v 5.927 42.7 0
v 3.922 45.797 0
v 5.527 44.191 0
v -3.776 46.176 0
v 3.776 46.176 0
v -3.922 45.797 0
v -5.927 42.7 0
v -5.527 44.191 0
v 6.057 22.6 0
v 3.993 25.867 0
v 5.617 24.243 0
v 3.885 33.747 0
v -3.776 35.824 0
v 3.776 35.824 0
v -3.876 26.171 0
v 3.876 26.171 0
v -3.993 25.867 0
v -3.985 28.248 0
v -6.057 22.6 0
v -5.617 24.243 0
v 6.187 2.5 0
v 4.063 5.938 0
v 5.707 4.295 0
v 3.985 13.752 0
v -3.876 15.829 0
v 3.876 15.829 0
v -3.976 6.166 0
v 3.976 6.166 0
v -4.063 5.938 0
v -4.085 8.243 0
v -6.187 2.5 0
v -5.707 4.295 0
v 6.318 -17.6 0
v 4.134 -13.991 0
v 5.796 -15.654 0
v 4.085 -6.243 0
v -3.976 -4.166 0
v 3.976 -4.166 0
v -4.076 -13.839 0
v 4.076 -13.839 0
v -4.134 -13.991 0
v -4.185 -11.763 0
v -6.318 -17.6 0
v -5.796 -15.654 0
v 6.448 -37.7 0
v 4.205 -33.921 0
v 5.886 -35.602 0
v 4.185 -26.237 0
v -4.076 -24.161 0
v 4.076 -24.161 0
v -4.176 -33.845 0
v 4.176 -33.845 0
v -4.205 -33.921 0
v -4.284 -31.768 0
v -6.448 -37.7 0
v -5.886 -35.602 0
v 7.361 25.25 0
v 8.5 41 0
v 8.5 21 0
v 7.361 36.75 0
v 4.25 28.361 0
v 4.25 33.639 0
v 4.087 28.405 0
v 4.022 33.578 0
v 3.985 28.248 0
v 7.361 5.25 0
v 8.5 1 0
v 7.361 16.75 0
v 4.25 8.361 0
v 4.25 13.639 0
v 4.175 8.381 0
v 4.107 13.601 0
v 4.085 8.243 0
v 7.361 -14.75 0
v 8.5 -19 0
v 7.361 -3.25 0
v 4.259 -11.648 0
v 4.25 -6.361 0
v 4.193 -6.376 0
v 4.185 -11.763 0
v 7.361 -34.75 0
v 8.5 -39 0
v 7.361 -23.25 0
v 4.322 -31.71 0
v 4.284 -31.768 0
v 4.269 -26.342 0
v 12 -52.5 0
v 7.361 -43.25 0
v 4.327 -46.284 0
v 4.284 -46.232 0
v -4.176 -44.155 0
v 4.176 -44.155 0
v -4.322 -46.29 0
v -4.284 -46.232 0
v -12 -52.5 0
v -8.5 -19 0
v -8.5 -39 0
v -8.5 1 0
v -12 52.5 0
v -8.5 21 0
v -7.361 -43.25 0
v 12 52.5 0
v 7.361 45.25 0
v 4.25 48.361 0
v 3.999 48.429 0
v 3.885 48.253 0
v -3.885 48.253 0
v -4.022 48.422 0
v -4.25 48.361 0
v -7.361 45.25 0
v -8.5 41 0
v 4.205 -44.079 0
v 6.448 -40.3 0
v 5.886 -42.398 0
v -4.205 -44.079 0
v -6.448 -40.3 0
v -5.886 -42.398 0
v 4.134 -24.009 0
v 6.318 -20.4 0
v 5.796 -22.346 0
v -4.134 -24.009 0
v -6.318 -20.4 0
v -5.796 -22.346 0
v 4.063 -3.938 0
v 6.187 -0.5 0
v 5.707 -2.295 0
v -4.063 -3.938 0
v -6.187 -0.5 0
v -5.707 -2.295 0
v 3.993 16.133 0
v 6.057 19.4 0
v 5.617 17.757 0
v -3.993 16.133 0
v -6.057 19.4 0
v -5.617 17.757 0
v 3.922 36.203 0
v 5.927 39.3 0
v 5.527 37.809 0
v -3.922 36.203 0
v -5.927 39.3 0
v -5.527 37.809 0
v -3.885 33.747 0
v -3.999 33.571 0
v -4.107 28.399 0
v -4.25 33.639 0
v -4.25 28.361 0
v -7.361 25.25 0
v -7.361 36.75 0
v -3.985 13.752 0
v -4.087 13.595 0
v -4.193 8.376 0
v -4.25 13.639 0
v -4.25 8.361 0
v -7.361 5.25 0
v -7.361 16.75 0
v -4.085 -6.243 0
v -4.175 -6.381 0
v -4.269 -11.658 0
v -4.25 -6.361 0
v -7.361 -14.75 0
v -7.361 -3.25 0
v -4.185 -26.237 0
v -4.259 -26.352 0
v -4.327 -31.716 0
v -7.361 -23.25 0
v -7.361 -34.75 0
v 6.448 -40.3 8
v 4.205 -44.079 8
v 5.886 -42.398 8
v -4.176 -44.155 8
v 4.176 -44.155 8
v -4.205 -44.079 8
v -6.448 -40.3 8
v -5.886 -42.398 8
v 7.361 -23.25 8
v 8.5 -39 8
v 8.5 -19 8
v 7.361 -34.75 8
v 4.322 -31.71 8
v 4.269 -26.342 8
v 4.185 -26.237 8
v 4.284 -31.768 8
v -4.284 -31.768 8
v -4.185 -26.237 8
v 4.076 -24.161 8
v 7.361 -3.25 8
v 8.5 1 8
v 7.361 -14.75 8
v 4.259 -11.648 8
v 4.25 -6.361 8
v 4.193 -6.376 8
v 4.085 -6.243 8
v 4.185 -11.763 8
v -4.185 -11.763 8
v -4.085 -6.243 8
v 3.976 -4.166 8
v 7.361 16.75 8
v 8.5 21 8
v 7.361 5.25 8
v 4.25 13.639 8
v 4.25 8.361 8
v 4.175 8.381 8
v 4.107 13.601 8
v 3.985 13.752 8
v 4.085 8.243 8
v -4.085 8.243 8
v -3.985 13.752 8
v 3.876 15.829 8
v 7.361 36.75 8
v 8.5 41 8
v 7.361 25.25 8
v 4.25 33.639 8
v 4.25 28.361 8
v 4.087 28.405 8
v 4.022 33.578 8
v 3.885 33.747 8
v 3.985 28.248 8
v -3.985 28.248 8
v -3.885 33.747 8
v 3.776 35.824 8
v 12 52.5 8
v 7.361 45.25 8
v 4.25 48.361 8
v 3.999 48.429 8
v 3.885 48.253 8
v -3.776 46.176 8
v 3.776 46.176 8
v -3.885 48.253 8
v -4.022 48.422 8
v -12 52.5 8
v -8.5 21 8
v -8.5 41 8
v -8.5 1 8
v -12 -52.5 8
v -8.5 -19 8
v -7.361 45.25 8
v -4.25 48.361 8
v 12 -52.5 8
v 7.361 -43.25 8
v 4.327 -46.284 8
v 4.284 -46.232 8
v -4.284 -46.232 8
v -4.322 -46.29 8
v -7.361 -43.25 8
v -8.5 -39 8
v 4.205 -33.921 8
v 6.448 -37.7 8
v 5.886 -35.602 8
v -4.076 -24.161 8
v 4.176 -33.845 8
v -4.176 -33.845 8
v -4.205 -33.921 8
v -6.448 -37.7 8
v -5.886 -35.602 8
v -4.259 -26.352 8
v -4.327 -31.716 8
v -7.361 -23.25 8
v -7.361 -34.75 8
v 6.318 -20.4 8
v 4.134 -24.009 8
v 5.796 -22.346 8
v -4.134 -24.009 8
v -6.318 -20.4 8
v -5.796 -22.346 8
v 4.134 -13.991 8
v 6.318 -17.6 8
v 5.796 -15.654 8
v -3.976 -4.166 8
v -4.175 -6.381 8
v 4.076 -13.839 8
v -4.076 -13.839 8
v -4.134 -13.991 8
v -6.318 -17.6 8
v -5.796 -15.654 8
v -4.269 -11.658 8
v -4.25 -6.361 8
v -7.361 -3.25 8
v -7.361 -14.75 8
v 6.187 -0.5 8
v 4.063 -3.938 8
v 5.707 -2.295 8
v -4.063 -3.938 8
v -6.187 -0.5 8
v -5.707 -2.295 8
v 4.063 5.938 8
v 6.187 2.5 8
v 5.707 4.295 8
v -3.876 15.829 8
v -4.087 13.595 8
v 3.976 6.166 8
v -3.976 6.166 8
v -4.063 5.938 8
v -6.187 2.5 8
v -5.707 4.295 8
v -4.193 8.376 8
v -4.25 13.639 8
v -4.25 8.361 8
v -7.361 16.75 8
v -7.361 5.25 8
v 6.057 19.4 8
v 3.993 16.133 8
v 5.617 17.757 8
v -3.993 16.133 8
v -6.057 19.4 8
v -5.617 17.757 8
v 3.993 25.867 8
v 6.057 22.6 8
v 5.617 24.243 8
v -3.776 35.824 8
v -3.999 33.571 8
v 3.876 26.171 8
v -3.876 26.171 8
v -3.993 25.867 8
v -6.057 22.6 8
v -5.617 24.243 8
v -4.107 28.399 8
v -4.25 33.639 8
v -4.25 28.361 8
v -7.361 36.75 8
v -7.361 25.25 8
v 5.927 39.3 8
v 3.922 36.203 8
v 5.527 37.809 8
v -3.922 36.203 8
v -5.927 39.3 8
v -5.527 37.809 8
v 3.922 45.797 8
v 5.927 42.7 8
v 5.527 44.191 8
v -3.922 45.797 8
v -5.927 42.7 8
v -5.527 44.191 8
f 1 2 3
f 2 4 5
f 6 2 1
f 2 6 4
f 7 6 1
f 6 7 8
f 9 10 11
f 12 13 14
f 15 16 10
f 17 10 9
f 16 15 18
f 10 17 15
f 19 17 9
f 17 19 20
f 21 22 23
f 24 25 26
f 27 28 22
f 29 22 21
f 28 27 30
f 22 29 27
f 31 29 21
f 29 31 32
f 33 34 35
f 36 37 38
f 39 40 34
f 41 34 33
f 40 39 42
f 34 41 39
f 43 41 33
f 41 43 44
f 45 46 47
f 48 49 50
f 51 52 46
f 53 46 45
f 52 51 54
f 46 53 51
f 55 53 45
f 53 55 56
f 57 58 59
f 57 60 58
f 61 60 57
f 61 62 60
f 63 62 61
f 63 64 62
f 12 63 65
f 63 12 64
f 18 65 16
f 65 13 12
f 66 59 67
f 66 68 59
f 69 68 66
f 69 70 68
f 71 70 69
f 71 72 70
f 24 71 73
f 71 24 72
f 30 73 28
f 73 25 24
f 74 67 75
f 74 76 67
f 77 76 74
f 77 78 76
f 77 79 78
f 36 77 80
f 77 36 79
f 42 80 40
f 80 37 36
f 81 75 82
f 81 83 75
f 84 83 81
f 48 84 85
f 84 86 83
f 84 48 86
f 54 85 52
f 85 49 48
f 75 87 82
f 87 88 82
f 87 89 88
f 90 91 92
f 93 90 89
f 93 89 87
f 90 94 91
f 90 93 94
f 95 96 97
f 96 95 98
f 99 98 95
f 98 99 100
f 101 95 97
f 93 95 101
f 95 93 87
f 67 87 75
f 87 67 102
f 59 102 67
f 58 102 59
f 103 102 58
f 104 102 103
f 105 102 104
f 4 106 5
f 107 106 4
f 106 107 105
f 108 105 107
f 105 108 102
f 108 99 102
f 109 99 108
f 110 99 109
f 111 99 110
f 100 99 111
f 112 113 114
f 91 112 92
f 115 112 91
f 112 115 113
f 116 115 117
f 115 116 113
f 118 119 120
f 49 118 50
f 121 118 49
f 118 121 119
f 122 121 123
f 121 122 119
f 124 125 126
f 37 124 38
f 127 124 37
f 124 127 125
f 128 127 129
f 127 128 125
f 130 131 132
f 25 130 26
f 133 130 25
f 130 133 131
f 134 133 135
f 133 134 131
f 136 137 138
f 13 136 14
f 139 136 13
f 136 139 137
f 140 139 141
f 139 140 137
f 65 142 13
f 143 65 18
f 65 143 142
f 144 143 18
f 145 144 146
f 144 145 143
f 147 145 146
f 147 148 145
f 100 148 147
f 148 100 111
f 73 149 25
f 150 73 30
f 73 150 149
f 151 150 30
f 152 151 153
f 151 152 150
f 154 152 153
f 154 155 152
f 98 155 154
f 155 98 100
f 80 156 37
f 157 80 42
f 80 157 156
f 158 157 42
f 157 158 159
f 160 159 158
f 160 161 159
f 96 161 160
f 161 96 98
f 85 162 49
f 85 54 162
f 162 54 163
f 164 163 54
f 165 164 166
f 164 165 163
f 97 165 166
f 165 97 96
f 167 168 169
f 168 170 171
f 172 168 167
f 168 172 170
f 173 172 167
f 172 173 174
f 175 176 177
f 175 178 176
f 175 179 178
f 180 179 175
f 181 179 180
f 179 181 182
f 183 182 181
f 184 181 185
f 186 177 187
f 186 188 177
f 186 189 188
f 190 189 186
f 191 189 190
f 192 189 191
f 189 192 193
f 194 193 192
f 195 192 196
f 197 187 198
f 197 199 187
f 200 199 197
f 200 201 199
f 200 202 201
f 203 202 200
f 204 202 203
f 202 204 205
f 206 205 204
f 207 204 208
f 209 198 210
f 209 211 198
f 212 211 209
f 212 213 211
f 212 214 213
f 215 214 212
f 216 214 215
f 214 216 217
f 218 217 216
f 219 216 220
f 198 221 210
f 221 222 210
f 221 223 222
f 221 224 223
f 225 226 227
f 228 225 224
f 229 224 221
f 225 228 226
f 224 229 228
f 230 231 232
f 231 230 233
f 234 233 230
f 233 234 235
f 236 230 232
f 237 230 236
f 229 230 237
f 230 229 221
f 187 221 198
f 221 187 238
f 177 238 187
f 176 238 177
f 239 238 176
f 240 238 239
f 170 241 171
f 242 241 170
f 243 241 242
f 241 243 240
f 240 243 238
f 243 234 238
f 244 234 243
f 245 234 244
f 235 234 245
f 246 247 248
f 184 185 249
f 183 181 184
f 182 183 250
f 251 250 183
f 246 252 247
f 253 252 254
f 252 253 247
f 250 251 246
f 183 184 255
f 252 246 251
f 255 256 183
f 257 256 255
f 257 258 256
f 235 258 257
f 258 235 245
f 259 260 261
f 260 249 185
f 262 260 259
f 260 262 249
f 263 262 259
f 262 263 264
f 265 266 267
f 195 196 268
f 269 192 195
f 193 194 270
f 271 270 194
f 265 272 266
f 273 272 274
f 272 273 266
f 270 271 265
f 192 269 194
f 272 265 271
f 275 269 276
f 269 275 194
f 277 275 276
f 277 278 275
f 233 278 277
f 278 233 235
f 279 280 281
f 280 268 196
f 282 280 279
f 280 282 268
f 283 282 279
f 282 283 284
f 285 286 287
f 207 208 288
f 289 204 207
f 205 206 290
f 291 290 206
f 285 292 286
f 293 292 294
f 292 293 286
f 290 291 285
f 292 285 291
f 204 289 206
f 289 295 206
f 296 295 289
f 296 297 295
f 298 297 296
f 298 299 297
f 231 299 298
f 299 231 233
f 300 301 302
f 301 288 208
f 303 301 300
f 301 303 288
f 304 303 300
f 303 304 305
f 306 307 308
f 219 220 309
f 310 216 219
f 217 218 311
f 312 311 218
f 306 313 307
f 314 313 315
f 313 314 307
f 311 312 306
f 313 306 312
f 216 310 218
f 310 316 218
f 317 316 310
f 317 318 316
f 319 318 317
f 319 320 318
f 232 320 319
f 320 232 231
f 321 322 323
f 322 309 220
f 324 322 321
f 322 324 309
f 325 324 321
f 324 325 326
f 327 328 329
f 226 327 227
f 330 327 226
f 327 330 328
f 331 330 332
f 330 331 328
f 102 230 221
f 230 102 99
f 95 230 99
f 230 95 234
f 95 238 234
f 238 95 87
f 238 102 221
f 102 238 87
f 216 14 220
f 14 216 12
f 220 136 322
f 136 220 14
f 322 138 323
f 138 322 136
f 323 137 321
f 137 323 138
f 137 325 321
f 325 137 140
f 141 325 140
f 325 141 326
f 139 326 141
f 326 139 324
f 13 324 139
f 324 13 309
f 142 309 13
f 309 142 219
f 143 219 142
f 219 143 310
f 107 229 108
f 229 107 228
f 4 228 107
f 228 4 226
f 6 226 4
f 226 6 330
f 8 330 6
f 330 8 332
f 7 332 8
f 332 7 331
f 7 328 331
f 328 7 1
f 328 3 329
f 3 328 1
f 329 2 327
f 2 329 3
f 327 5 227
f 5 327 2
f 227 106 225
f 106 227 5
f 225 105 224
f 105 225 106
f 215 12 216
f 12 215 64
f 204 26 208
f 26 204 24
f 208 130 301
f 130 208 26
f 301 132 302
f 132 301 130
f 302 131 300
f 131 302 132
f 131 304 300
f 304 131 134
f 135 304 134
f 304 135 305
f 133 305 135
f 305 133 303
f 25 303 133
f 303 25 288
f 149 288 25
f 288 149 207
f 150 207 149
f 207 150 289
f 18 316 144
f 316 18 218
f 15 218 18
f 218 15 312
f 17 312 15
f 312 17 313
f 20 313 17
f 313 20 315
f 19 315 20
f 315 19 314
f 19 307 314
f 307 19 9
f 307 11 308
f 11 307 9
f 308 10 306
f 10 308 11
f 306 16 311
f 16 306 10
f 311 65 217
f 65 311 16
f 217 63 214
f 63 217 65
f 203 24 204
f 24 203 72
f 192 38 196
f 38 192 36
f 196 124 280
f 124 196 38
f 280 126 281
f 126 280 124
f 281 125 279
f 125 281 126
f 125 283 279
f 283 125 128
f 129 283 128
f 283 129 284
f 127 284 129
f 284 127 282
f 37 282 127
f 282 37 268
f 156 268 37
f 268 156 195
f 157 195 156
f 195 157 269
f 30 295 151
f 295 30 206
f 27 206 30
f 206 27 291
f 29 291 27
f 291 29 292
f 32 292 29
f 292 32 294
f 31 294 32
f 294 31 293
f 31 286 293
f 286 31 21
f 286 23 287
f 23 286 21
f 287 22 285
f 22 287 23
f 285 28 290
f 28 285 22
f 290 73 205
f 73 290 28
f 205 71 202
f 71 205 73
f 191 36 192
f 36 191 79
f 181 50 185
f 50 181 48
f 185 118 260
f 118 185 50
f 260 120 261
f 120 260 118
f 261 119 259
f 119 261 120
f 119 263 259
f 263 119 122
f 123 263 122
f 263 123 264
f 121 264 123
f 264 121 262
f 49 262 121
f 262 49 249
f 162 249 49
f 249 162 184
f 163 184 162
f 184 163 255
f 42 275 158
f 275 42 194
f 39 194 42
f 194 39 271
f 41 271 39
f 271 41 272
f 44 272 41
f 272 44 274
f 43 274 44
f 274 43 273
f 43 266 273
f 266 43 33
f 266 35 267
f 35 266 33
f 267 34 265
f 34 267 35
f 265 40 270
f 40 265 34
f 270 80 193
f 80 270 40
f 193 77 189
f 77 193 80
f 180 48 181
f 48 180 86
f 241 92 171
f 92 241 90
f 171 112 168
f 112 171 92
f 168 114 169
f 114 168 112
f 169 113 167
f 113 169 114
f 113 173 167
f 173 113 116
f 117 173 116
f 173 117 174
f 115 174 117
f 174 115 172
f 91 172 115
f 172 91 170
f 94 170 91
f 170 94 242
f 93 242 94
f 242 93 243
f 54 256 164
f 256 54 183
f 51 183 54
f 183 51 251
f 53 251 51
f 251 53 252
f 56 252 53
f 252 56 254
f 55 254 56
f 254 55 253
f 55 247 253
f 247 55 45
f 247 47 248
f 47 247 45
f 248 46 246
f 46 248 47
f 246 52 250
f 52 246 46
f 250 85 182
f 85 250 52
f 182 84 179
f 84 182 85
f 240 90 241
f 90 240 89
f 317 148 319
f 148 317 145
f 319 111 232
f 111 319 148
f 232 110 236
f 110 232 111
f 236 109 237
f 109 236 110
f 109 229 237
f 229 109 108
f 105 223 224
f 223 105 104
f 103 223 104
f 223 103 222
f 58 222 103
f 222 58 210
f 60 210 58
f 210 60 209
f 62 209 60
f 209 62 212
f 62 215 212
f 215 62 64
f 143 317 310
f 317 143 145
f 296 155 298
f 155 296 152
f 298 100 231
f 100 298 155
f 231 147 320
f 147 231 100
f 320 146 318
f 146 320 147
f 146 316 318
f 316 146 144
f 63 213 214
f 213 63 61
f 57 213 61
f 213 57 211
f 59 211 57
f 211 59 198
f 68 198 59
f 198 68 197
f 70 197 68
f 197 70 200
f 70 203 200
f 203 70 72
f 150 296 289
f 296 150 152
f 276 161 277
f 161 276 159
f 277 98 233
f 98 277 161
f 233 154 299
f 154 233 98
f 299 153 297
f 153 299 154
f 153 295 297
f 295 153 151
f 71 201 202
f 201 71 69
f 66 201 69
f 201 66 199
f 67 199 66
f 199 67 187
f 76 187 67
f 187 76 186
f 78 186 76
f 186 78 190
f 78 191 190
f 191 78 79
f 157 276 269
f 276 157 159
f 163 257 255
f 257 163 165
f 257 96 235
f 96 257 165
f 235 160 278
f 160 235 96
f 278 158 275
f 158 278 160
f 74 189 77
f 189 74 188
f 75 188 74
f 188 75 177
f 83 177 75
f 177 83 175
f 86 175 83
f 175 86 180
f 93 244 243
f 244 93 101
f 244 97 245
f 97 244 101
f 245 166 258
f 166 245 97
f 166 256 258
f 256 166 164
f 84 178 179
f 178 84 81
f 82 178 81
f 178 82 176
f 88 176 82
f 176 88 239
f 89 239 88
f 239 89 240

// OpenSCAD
linear_extrude(8) {
  difference() {
    square([24, 105], center = true);

    translate([0, -59, 0])  for (i = [0.1 : 0.1 : 0.5])
      translate([0, i * 200, 0]) {
        offset(i) {
          difference() {
            circle(d = 17, $fn = 12);
            circle(d = 13.8, $fn = 12);
            rotate([0, 0, 93]) square([20, 8], center = true);
            rotate([0, 0, 87]) square([20, 8], center = true);
          }
          
          translate([-8, -1.2, 0]) square([16, 2.4]);
      }
    }
  }
}

translate([0, 0, 0])
linear_extrude(8) {
  difference() {
    square([24, 105], center = true);

    translate([0, -59, 0])  for (i = [0.1 : 0.1 : 0.5])
      translate([0, i * 200, 0]) offset(0) {
        difference() {
          circle(d = 17, $fn = 12);
        }
        
        translate([-8, -1.2, 0]) square([16, 2.4]);
      }
  }
}
